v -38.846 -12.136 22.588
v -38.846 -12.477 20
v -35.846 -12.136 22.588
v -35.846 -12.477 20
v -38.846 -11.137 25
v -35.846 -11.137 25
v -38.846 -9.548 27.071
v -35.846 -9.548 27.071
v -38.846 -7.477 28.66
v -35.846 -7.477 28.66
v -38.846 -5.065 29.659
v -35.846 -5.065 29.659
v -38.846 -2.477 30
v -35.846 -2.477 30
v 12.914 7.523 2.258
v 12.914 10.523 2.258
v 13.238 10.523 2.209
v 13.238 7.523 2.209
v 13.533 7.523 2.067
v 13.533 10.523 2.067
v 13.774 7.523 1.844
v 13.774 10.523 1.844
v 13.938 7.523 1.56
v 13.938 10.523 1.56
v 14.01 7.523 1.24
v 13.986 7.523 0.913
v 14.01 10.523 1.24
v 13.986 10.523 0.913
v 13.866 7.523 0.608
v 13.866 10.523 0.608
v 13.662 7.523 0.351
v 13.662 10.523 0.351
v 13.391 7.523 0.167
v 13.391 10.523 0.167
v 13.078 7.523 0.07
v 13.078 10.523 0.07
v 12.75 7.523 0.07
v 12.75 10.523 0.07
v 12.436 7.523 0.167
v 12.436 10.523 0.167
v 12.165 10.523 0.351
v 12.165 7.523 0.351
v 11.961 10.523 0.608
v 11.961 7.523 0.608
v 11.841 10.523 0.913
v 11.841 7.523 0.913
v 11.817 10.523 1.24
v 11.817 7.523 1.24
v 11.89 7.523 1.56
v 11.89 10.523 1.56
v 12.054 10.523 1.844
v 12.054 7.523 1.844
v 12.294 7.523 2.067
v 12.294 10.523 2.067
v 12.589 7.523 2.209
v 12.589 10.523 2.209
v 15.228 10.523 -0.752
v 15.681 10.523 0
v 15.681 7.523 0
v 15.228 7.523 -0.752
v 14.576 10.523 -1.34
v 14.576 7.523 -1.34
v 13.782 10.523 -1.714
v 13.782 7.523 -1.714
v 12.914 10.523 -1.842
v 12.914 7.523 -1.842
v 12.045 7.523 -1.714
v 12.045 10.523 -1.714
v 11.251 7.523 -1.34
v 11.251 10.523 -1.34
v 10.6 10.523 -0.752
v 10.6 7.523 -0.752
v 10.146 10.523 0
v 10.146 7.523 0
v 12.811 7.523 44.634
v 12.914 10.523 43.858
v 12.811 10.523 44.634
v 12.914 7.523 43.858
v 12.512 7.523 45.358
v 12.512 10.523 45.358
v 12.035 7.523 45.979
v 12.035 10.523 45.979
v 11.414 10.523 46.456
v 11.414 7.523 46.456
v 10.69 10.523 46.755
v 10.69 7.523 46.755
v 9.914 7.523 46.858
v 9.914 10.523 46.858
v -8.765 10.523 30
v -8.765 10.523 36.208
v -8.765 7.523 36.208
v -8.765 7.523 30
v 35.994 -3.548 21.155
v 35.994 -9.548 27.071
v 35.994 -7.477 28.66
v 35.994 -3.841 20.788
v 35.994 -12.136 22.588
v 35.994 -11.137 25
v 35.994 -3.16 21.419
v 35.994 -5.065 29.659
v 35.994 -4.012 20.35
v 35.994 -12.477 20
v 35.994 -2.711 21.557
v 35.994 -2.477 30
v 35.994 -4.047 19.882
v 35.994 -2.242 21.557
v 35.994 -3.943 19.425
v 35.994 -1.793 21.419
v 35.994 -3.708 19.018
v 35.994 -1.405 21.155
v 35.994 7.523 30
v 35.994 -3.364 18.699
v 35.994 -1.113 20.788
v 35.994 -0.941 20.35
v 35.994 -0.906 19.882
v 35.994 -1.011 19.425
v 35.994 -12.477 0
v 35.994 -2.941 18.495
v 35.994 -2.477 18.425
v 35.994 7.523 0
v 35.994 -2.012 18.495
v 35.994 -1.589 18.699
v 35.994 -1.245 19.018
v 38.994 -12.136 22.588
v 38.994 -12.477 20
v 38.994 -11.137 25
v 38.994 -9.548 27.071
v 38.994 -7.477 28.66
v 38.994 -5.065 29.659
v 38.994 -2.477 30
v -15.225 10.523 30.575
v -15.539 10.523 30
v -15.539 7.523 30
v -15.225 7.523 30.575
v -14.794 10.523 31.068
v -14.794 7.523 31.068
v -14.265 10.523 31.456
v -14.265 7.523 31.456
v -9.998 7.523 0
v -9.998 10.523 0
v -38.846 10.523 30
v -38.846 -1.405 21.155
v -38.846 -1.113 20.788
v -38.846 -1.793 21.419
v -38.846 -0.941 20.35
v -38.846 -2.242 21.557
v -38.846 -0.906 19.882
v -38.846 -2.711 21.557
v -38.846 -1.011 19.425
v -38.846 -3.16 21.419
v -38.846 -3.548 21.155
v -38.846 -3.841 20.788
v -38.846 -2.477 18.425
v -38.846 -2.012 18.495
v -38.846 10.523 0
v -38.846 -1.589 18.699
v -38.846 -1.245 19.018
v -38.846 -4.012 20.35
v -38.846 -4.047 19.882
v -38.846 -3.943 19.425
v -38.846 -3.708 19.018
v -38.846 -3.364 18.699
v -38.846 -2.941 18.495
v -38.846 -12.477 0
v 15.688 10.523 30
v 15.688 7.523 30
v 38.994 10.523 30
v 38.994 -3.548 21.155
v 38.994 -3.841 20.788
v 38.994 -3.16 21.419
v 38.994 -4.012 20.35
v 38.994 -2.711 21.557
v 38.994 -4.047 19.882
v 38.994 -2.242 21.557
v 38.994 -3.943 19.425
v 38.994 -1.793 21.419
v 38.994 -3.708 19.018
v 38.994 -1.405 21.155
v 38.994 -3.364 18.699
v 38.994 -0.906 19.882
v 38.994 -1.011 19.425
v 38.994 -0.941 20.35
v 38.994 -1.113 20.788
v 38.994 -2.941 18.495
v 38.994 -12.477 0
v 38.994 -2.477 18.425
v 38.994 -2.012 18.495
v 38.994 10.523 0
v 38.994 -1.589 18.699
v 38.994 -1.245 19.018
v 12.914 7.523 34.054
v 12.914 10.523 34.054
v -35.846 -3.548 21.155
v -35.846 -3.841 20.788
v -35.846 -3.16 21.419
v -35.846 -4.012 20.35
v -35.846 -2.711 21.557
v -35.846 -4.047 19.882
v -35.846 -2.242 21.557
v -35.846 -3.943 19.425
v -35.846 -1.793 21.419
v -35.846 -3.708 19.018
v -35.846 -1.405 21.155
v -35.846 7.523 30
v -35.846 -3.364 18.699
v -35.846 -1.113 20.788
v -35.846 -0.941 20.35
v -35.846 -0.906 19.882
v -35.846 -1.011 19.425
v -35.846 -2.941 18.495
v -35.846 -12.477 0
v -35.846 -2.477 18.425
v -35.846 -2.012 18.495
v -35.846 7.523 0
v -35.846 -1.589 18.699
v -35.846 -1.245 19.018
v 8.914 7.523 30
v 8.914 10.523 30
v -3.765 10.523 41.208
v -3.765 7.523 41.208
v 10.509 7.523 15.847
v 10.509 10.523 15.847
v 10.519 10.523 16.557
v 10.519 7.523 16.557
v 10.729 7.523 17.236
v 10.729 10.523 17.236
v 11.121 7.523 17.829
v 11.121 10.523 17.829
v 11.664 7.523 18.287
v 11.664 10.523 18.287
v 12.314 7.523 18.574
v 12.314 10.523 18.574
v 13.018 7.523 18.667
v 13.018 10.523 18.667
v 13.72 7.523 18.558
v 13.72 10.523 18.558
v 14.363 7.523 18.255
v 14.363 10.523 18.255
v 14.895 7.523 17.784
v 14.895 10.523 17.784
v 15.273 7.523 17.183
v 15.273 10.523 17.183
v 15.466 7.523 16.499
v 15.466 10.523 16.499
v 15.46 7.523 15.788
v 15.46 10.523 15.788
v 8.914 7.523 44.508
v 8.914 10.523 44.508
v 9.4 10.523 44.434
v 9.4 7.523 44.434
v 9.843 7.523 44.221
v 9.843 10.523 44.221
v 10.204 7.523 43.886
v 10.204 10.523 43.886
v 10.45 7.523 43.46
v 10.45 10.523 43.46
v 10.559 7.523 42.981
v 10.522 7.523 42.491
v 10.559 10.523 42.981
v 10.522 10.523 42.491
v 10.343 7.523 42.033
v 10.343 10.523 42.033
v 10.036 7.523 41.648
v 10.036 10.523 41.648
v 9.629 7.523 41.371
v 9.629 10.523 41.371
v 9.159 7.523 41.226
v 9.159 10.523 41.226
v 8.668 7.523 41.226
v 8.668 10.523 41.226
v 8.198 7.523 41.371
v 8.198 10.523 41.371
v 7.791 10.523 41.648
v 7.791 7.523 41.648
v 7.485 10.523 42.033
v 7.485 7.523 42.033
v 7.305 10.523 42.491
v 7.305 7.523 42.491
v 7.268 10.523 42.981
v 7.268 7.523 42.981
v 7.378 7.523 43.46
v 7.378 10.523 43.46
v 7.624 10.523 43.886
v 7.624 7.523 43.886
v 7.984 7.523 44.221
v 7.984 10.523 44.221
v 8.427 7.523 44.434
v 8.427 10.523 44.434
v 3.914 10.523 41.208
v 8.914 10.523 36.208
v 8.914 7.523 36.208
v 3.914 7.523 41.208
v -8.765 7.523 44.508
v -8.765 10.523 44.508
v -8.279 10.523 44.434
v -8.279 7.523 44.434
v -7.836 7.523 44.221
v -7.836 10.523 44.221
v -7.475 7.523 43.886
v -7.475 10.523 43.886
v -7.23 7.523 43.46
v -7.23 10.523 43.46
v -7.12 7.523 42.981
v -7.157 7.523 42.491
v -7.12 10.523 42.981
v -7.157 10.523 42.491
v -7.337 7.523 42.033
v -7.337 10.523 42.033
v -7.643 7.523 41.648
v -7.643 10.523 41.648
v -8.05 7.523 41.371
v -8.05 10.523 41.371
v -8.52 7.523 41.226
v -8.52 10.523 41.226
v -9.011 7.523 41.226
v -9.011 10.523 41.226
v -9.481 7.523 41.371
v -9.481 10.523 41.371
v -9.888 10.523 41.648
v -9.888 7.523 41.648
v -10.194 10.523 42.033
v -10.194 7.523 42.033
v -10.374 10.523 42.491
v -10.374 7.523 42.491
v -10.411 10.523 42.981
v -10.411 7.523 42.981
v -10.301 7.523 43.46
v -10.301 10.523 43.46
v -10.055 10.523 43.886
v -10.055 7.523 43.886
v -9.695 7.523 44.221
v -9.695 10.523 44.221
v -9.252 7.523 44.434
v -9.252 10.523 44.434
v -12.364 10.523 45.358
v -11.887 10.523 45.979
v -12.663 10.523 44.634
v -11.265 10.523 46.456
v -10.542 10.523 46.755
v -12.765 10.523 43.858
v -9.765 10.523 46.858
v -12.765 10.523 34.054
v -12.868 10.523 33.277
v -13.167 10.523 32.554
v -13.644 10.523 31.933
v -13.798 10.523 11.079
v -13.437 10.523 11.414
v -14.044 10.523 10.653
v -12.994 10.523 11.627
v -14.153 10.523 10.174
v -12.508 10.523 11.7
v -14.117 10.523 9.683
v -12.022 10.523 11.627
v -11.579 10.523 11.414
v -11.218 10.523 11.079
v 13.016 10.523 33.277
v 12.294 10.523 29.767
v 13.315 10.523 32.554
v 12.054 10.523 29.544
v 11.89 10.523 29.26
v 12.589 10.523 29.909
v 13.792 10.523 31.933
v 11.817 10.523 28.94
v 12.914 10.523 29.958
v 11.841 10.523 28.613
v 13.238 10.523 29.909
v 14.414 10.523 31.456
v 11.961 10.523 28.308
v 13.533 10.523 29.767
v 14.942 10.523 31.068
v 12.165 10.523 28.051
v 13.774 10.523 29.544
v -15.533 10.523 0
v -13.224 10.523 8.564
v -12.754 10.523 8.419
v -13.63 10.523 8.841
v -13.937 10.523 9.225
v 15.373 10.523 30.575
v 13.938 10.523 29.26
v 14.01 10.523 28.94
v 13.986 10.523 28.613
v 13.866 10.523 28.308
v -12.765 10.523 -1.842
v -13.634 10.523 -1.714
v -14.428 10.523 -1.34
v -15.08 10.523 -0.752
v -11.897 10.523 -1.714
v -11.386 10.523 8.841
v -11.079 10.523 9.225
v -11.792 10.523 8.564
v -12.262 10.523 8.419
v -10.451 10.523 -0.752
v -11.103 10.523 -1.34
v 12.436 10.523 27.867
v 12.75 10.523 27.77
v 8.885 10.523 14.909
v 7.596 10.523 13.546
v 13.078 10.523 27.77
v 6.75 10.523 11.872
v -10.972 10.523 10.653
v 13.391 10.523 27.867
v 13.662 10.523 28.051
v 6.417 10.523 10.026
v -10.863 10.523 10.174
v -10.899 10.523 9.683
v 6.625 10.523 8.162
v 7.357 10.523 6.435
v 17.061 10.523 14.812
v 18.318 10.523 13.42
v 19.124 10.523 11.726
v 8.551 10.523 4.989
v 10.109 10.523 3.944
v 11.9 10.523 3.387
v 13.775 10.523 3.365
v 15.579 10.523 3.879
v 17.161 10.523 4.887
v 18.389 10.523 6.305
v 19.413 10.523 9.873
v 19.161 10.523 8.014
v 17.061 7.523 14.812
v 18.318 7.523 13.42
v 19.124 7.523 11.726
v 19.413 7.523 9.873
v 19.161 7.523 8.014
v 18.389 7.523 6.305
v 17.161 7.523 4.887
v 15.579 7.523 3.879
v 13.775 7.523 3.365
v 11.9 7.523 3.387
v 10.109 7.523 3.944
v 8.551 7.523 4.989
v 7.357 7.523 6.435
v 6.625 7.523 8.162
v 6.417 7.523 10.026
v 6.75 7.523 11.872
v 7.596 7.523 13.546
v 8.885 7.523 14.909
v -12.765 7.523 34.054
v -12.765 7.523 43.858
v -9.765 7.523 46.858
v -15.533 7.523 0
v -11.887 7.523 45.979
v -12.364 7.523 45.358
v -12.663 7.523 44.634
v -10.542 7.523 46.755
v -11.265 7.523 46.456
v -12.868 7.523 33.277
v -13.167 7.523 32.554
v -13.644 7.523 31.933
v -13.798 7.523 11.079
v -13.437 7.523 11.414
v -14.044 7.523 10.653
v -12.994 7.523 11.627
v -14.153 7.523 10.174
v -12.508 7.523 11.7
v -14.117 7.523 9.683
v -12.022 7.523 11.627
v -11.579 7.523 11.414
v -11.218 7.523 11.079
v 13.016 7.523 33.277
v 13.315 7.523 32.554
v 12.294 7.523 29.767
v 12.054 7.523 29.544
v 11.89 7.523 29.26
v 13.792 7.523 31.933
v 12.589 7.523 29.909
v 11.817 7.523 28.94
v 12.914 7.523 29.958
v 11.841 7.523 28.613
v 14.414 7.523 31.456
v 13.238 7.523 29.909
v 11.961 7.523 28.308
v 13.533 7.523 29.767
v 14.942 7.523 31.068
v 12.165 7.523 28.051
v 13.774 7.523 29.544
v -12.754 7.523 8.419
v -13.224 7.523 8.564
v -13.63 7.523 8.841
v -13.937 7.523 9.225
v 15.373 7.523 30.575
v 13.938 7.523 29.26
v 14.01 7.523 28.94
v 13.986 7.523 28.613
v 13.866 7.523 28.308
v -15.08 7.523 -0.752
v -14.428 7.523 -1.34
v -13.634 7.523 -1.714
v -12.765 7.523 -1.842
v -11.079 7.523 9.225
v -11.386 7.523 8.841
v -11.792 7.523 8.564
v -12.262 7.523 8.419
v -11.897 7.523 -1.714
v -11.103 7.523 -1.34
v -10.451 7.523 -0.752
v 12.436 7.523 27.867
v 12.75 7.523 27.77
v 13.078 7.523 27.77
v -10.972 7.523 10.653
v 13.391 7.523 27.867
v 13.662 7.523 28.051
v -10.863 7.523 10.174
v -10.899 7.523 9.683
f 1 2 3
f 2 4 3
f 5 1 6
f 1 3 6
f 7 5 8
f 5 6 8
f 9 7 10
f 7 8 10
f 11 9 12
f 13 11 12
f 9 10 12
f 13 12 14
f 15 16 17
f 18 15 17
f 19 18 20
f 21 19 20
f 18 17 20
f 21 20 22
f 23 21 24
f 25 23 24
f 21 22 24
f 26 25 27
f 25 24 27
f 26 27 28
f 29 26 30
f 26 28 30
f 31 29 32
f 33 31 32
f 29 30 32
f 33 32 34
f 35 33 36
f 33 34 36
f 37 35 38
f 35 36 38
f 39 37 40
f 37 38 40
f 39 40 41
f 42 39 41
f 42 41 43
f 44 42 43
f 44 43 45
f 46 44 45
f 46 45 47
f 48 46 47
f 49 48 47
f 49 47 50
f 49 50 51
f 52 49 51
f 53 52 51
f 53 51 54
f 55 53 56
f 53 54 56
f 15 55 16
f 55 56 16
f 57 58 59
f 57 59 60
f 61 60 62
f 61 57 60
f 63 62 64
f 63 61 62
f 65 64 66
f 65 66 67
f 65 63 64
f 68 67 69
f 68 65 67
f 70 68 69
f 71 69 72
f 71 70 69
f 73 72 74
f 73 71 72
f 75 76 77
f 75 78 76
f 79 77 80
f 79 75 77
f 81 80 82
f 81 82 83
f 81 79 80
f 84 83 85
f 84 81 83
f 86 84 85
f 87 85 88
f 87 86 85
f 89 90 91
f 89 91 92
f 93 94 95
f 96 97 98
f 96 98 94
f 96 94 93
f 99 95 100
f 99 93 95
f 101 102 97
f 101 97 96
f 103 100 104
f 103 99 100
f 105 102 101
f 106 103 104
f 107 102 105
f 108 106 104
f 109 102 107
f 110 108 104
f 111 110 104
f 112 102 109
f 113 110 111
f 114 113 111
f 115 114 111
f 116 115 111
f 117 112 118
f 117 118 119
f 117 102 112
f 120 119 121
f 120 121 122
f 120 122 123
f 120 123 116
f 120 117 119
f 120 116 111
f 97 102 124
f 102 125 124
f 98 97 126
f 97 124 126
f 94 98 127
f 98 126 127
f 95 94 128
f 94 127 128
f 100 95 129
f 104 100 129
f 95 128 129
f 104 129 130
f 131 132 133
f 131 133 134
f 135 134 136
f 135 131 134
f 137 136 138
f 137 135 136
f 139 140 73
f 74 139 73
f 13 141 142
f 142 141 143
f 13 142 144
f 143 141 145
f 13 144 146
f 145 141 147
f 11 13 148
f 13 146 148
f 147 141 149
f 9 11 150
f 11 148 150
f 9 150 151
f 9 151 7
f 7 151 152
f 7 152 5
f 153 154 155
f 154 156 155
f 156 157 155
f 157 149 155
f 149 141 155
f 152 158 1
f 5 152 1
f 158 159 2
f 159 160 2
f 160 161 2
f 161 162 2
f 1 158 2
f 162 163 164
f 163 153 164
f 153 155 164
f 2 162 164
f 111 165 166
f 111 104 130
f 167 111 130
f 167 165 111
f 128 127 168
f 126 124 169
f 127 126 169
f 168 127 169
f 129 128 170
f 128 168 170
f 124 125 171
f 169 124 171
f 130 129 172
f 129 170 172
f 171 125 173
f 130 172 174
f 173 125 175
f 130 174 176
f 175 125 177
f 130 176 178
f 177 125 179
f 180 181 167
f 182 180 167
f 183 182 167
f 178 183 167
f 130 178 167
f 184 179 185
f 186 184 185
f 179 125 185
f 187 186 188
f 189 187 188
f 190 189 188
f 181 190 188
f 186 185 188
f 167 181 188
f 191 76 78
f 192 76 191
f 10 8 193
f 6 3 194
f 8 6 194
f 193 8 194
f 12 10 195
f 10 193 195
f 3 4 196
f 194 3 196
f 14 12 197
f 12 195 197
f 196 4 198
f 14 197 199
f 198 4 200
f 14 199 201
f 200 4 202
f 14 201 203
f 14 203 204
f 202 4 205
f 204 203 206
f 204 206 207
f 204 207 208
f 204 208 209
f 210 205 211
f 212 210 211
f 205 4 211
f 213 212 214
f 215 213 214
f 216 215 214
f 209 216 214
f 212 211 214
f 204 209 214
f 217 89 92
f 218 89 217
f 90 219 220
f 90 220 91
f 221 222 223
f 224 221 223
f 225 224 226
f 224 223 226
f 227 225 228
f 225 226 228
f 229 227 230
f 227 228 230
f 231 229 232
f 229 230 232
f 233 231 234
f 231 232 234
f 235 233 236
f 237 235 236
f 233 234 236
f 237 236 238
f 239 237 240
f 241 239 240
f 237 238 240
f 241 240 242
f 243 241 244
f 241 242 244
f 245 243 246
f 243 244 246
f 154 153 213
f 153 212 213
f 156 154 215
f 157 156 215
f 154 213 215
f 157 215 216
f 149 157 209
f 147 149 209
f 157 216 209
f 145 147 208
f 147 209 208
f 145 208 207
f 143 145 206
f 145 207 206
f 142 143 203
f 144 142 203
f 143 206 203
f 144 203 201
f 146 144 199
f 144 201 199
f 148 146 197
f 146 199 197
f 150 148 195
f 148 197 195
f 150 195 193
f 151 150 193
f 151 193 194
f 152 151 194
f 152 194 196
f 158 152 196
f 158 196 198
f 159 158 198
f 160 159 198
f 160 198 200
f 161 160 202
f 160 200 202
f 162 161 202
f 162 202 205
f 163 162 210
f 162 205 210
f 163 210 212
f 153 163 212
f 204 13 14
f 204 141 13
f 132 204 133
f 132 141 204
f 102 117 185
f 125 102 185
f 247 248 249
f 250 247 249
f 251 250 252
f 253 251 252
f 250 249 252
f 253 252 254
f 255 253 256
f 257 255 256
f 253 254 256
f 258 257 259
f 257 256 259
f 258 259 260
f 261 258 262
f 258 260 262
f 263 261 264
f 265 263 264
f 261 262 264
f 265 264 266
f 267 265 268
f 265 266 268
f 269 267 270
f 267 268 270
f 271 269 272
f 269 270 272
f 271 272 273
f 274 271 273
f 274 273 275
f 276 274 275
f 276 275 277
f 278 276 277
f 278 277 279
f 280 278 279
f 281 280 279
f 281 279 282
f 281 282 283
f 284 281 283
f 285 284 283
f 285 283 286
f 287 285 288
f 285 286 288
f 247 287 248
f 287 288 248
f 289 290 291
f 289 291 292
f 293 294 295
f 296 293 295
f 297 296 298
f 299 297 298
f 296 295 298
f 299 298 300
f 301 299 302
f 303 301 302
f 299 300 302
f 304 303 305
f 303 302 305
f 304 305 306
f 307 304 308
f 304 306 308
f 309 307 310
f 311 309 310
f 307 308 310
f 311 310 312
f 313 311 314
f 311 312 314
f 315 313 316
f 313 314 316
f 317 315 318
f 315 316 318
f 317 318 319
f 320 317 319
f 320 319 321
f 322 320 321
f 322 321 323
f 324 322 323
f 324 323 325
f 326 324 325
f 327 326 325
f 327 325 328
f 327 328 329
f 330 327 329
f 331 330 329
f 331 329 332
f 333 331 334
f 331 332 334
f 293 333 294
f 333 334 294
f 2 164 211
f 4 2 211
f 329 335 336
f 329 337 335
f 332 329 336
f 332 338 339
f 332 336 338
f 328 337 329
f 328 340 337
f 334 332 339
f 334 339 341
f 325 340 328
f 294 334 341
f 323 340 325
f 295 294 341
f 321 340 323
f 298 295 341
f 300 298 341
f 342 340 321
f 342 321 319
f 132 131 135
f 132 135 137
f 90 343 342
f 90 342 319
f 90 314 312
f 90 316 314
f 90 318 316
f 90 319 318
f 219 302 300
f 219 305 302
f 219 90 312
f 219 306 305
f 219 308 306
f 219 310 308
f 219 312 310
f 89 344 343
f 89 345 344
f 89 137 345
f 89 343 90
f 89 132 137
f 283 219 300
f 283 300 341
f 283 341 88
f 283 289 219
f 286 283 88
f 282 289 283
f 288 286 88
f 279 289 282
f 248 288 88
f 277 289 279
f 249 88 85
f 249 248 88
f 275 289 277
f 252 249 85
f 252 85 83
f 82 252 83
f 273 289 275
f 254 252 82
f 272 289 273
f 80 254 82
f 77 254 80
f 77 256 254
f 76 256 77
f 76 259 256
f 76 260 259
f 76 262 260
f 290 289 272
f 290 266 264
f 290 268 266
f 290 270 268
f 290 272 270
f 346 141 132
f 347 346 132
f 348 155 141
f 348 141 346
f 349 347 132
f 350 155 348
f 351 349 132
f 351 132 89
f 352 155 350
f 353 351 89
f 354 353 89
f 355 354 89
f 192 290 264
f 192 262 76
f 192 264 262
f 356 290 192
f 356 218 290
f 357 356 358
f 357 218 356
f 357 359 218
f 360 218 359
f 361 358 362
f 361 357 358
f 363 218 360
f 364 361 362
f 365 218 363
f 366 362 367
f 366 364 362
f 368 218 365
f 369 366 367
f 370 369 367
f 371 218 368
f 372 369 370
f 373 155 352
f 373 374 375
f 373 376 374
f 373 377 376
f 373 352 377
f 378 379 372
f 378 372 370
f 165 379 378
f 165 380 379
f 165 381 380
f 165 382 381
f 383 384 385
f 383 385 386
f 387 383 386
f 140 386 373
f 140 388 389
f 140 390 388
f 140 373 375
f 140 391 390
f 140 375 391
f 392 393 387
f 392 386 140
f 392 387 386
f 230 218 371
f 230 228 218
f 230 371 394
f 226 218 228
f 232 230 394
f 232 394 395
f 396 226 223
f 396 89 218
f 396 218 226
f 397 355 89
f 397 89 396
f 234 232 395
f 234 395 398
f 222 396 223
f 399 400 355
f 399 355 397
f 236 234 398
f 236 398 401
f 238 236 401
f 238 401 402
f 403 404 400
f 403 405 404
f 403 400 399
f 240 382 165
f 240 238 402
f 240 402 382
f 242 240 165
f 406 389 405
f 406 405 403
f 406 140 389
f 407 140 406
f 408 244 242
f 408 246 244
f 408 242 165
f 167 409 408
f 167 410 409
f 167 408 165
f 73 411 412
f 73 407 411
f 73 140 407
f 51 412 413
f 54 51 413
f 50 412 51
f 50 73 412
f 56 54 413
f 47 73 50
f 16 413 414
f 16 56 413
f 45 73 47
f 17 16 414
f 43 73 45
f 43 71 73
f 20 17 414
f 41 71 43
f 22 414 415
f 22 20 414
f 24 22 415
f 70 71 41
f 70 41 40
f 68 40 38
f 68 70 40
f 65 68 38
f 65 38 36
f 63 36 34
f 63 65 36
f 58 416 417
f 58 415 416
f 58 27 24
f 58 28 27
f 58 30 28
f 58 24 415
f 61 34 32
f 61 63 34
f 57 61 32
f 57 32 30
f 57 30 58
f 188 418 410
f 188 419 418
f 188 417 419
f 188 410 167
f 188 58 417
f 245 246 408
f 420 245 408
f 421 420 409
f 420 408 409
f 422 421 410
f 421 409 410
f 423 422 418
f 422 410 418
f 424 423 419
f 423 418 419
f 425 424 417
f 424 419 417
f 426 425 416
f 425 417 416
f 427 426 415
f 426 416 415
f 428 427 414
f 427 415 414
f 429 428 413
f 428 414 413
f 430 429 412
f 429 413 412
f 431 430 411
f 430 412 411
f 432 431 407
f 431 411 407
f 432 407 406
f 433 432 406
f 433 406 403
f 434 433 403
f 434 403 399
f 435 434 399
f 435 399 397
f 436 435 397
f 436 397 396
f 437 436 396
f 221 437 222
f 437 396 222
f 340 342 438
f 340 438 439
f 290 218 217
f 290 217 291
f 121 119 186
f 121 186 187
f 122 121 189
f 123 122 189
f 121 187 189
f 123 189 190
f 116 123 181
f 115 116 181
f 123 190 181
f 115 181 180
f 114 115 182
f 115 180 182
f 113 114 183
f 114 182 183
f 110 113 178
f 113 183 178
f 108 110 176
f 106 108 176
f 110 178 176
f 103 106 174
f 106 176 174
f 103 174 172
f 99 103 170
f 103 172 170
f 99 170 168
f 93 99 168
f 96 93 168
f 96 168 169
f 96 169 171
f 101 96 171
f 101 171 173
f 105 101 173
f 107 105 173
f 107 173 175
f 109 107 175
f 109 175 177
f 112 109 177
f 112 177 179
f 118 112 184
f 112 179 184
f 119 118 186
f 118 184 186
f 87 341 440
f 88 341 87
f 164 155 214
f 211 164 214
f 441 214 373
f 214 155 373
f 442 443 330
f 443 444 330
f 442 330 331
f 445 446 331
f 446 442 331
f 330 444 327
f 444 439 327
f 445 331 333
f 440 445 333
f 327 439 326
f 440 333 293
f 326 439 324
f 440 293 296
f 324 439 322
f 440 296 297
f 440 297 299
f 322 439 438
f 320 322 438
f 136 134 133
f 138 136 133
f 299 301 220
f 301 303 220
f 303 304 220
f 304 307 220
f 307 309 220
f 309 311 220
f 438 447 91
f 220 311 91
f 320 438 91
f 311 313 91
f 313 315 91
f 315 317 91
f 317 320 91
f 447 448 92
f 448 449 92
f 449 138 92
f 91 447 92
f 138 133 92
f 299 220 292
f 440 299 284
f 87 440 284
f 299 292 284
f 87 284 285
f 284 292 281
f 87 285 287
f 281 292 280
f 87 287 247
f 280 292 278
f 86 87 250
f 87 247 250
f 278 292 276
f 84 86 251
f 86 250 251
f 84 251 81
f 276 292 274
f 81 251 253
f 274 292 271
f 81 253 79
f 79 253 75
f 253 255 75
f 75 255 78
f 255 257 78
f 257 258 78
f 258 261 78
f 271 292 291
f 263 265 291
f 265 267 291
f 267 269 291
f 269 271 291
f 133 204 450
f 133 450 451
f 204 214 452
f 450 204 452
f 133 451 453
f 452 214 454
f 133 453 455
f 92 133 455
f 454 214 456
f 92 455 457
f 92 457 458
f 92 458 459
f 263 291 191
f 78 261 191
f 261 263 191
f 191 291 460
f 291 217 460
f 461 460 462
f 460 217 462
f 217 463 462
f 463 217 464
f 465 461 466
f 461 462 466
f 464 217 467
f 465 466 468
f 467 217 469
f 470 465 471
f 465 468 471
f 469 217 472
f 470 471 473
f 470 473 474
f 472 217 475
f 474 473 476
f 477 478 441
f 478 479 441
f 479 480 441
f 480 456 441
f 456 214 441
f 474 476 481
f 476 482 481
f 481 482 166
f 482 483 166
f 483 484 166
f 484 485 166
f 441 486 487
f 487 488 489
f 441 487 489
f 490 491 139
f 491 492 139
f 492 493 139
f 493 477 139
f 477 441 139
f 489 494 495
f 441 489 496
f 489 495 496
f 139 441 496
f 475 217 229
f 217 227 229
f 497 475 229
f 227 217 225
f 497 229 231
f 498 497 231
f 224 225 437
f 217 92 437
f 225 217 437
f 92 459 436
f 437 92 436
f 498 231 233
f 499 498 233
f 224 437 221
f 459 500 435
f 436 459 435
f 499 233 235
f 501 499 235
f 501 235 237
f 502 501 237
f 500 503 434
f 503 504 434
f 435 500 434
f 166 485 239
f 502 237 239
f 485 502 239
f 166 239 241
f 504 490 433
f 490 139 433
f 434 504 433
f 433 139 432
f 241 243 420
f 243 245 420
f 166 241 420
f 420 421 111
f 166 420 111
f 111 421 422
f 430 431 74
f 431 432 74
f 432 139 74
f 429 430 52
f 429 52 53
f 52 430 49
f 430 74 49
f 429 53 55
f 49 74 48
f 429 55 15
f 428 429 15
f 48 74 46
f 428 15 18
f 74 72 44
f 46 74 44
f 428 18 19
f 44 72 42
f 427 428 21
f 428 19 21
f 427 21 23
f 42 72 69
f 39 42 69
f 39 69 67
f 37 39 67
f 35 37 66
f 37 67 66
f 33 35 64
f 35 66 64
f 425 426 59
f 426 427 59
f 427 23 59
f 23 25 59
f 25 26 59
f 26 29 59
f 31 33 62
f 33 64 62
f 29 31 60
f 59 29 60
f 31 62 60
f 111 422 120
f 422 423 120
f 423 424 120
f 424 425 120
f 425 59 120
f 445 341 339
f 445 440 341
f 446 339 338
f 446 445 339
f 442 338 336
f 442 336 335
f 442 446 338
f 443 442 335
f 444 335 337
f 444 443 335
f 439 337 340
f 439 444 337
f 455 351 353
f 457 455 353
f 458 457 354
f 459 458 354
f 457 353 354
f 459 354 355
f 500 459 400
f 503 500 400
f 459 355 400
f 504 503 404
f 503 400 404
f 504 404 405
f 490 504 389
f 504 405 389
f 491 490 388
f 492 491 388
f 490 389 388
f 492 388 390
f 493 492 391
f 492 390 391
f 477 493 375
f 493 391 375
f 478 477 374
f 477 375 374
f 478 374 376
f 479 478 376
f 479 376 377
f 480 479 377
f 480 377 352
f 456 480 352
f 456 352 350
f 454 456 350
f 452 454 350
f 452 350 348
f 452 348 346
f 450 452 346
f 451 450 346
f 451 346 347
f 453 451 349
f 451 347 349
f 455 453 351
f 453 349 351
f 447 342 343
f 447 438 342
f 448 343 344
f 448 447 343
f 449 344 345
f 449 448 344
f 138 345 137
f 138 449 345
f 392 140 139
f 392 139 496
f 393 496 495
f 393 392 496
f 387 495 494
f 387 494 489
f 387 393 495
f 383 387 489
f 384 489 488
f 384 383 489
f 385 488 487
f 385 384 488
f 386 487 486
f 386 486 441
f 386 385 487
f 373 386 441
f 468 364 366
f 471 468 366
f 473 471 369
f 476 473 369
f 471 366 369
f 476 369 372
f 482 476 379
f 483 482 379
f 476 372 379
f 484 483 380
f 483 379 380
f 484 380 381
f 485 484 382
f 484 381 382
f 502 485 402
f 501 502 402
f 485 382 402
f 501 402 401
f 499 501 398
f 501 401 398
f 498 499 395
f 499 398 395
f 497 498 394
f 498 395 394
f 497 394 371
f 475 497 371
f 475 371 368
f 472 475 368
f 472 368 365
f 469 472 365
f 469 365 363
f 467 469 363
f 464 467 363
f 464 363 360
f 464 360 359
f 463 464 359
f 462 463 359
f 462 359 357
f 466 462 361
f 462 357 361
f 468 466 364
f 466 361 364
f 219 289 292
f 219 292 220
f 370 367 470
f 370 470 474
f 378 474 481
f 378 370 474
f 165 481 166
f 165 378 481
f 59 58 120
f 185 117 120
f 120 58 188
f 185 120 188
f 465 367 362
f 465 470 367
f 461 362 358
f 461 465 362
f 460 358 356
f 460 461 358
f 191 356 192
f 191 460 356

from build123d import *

# Parameters (mm, degrees)
SKETCH1_W           = 3
SKETCH1_H           = 20
SKETCH1_H_2         = 3
SKETCH1_W_2         = 71.840634077
BOSS_EXTRUDE1_DEPTH = 30
FILLET1_R           = 10
SKETCH2_R           = 1.575
CUT_EXTRUDE1_DEPTH  = 50
SKETCH3_R           = 6.5
SKETCH3_R_2         = 2.5
SKETCH3_R_3         = 1.1
SKETCH3_R_4         = 1.65
CUT_EXTRUDE2_DEPTH  = 3
SKETCH4_R           = 1.65
BOSS_EXTRUDE2_DEPTH = 3
FILLET3_R           = 3


with BuildPart() as part:
    # Sketch1 → Boss-Extrude1 (new body)
    with BuildSketch(Plane.XY):
        with Locations((-37.346255817, -2.476707935)):
            Rectangle(SKETCH1_W, SKETCH1_H)
        with Locations((-37.346255817, 9.023292065)):
            Rectangle(SKETCH1_W, SKETCH1_H_2)
        with Locations((0.074061222, 9.023292065)):
            Rectangle(SKETCH1_W_2, SKETCH1_H_2)
        with Locations((37.49437826, 9.023292065)):
            Rectangle(SKETCH1_W, SKETCH1_H_2)
        with Locations((37.49437826, -2.476707935)):
            Rectangle(SKETCH1_W, SKETCH1_H)
    extrude(amount=BOSS_EXTRUDE1_DEPTH)

    # Fillet1
    fillet1_edges = [part.edges().sort_by_distance(p)[0] for p in [
        (37.49437826, -12.476707935, 30),
        (-37.346255817, -12.476707935, 30),
    ]]
    fillet(fillet1_edges, radius=FILLET1_R)

    # Sketch2 → Cut-Extrude1 (cut, symmetric)
    with BuildSketch(Plane(origin=(0, 0, 0), x_dir=(0, 0, -1), z_dir=(1, 0, 0))):
        with Locations((-20, -2.476707935)):
            Circle(SKETCH2_R)
    extrude(amount=CUT_EXTRUDE1_DEPTH, both=True, mode=Mode.SUBTRACT)

    # Sketch3 → Cut-Extrude2 (cut)
    with BuildSketch(Plane(origin=(0, 10.523292065, 0), x_dir=(1, 0, 0), z_dir=(0, 1, 0))):
        with Locations((12.913568062, -9.80768247)):
            Circle(SKETCH3_R)
        with Locations((12.988568062, -16.167156082)):
            Circle(SKETCH3_R_2)
        with Locations(Location((12.913568062, -1.15768247, 0), (0, 0, 270))):
            Circle(SKETCH3_R_3)
        with Locations(Location((12.913568062, -28.85768247, 0), (0, 0, 270))):
            Circle(SKETCH3_R_3)
        with Locations(Location((-12.507980061, -10.050384435, 0), (0, 0, 270))):
            Circle(SKETCH3_R_4)
    extrude(amount=-CUT_EXTRUDE2_DEPTH, mode=Mode.SUBTRACT)

    # Sketch4 → Boss-Extrude2 (add)
    # profile 1 of 5: a face of its own
    with BuildSketch(Plane(origin=(0, 10.523292065, 0), x_dir=(1, 0, 0), z_dir=(0, 1, 0))):
        with BuildLine():
            Line((15.687574309, -30), (10.139561814, -30))
            ThreePointArc((10.139561814, -30), (11.244279679, -31.350367026), (12.913568062, -31.85768247))
            ThreePointArc((12.913568062, -31.85768247), (14.582856444, -31.350367026), (15.687574309, -30))
        make_face()
    # profile 2 of 5: a face of its own
    with BuildSketch(Plane(origin=(0, 10.523292065, 0), x_dir=(1, 0, 0), z_dir=(0, 1, 0))):
        with BuildLine():
            Line((10.145938878, 0), (15.681197245, 0))
            ThreePointArc((15.681197245, 0), (12.913568062, 1.84231753), (10.145938878, 0))
        make_face()
    # profile 3 of 5: a face of its own
    with BuildSketch(Plane(origin=(0, 10.523292065, 0), x_dir=(1, 0, 0), z_dir=(0, 1, 0))):
        with BuildLine():
            Line((-3.765445619, -41.20768247), (-8.765445619, -36.20768247))
            Line((-8.765445619, -36.20768247), (-8.765445619, -30))
            Line((-8.765445619, -30), (-9.991439371, -30))
            ThreePointArc((-9.991439371, -30), (-11.096157236, -31.350367026), (-12.765445619, -31.85768247))
            Line((-12.765445619, -31.85768247), (-12.765445619, -46.85768247))
            Line((-12.765445619, -46.85768247), (-6.765445619, -46.85768247))
            Line((-6.765445619, -46.85768247), (6.913568062, -46.85768247))
            Line((6.913568062, -46.85768247), (12.913568062, -46.85768247))
            Line((12.913568062, -46.85768247), (12.913568062, -31.85768247))
            ThreePointArc((12.913568062, -31.85768247), (11.244279679, -31.350367026), (10.139561814, -30))
            Line((10.139561814, -30), (8.913568062, -30))
            Line((8.913568062, -30), (8.913568062, -36.20768247))
            Line((8.913568062, -36.20768247), (3.913568062, -41.20768247))
            Line((3.913568062, -41.20768247), (-3.765445619, -41.20768247))
        make_face()
        with Locations(Location((-8.765445619, -42.85768247, 0), (0, 0, 270))):
            Circle(SKETCH4_R, mode=Mode.SUBTRACT)
        with Locations(Location((8.913568062, -42.85768247, 0), (0, 0, 270))):
            Circle(SKETCH4_R, mode=Mode.SUBTRACT)
    # profile 4 of 5: a face of its own
    with BuildSketch(Plane(origin=(0, 10.523292065, 0), x_dir=(1, 0, 0), z_dir=(0, 1, 0))):
        with BuildLine():
            ThreePointArc((-12.765445619, -31.85768247), (-11.096157236, -31.350367026), (-9.991439371, -30))
            Line((-9.991439371, -30), (-15.539451866, -30))
            ThreePointArc((-15.539451866, -30), (-14.434734002, -31.350367026), (-12.765445619, -31.85768247))
        make_face()
    # profile 5 of 5: a face of its own
    with BuildSketch(Plane(origin=(0, 10.523292065, 0), x_dir=(1, 0, 0), z_dir=(0, 1, 0))):
        with BuildLine():
            Line((-15.533074803, 0), (-9.997816435, 0))
            ThreePointArc((-9.997816435, 0), (-12.765445619, 1.84231753), (-15.533074803, 0))
        make_face()
    extrude(amount=-BOSS_EXTRUDE2_DEPTH)

    # Fillet3
    fillet3_edges = [part.edges().sort_by_distance(p)[0] for p in [
        (12.913568062, 9.023292065, 31.85768247),
        (12.913568062, 9.023292065, 46.85768247),
        (-12.765445619, 9.023292065, 46.85768247),
        (-12.765445619, 9.023292065, 31.85768247),
    ]]
    fillet(fillet3_edges, radius=FILLET3_R)


solid = part.part
